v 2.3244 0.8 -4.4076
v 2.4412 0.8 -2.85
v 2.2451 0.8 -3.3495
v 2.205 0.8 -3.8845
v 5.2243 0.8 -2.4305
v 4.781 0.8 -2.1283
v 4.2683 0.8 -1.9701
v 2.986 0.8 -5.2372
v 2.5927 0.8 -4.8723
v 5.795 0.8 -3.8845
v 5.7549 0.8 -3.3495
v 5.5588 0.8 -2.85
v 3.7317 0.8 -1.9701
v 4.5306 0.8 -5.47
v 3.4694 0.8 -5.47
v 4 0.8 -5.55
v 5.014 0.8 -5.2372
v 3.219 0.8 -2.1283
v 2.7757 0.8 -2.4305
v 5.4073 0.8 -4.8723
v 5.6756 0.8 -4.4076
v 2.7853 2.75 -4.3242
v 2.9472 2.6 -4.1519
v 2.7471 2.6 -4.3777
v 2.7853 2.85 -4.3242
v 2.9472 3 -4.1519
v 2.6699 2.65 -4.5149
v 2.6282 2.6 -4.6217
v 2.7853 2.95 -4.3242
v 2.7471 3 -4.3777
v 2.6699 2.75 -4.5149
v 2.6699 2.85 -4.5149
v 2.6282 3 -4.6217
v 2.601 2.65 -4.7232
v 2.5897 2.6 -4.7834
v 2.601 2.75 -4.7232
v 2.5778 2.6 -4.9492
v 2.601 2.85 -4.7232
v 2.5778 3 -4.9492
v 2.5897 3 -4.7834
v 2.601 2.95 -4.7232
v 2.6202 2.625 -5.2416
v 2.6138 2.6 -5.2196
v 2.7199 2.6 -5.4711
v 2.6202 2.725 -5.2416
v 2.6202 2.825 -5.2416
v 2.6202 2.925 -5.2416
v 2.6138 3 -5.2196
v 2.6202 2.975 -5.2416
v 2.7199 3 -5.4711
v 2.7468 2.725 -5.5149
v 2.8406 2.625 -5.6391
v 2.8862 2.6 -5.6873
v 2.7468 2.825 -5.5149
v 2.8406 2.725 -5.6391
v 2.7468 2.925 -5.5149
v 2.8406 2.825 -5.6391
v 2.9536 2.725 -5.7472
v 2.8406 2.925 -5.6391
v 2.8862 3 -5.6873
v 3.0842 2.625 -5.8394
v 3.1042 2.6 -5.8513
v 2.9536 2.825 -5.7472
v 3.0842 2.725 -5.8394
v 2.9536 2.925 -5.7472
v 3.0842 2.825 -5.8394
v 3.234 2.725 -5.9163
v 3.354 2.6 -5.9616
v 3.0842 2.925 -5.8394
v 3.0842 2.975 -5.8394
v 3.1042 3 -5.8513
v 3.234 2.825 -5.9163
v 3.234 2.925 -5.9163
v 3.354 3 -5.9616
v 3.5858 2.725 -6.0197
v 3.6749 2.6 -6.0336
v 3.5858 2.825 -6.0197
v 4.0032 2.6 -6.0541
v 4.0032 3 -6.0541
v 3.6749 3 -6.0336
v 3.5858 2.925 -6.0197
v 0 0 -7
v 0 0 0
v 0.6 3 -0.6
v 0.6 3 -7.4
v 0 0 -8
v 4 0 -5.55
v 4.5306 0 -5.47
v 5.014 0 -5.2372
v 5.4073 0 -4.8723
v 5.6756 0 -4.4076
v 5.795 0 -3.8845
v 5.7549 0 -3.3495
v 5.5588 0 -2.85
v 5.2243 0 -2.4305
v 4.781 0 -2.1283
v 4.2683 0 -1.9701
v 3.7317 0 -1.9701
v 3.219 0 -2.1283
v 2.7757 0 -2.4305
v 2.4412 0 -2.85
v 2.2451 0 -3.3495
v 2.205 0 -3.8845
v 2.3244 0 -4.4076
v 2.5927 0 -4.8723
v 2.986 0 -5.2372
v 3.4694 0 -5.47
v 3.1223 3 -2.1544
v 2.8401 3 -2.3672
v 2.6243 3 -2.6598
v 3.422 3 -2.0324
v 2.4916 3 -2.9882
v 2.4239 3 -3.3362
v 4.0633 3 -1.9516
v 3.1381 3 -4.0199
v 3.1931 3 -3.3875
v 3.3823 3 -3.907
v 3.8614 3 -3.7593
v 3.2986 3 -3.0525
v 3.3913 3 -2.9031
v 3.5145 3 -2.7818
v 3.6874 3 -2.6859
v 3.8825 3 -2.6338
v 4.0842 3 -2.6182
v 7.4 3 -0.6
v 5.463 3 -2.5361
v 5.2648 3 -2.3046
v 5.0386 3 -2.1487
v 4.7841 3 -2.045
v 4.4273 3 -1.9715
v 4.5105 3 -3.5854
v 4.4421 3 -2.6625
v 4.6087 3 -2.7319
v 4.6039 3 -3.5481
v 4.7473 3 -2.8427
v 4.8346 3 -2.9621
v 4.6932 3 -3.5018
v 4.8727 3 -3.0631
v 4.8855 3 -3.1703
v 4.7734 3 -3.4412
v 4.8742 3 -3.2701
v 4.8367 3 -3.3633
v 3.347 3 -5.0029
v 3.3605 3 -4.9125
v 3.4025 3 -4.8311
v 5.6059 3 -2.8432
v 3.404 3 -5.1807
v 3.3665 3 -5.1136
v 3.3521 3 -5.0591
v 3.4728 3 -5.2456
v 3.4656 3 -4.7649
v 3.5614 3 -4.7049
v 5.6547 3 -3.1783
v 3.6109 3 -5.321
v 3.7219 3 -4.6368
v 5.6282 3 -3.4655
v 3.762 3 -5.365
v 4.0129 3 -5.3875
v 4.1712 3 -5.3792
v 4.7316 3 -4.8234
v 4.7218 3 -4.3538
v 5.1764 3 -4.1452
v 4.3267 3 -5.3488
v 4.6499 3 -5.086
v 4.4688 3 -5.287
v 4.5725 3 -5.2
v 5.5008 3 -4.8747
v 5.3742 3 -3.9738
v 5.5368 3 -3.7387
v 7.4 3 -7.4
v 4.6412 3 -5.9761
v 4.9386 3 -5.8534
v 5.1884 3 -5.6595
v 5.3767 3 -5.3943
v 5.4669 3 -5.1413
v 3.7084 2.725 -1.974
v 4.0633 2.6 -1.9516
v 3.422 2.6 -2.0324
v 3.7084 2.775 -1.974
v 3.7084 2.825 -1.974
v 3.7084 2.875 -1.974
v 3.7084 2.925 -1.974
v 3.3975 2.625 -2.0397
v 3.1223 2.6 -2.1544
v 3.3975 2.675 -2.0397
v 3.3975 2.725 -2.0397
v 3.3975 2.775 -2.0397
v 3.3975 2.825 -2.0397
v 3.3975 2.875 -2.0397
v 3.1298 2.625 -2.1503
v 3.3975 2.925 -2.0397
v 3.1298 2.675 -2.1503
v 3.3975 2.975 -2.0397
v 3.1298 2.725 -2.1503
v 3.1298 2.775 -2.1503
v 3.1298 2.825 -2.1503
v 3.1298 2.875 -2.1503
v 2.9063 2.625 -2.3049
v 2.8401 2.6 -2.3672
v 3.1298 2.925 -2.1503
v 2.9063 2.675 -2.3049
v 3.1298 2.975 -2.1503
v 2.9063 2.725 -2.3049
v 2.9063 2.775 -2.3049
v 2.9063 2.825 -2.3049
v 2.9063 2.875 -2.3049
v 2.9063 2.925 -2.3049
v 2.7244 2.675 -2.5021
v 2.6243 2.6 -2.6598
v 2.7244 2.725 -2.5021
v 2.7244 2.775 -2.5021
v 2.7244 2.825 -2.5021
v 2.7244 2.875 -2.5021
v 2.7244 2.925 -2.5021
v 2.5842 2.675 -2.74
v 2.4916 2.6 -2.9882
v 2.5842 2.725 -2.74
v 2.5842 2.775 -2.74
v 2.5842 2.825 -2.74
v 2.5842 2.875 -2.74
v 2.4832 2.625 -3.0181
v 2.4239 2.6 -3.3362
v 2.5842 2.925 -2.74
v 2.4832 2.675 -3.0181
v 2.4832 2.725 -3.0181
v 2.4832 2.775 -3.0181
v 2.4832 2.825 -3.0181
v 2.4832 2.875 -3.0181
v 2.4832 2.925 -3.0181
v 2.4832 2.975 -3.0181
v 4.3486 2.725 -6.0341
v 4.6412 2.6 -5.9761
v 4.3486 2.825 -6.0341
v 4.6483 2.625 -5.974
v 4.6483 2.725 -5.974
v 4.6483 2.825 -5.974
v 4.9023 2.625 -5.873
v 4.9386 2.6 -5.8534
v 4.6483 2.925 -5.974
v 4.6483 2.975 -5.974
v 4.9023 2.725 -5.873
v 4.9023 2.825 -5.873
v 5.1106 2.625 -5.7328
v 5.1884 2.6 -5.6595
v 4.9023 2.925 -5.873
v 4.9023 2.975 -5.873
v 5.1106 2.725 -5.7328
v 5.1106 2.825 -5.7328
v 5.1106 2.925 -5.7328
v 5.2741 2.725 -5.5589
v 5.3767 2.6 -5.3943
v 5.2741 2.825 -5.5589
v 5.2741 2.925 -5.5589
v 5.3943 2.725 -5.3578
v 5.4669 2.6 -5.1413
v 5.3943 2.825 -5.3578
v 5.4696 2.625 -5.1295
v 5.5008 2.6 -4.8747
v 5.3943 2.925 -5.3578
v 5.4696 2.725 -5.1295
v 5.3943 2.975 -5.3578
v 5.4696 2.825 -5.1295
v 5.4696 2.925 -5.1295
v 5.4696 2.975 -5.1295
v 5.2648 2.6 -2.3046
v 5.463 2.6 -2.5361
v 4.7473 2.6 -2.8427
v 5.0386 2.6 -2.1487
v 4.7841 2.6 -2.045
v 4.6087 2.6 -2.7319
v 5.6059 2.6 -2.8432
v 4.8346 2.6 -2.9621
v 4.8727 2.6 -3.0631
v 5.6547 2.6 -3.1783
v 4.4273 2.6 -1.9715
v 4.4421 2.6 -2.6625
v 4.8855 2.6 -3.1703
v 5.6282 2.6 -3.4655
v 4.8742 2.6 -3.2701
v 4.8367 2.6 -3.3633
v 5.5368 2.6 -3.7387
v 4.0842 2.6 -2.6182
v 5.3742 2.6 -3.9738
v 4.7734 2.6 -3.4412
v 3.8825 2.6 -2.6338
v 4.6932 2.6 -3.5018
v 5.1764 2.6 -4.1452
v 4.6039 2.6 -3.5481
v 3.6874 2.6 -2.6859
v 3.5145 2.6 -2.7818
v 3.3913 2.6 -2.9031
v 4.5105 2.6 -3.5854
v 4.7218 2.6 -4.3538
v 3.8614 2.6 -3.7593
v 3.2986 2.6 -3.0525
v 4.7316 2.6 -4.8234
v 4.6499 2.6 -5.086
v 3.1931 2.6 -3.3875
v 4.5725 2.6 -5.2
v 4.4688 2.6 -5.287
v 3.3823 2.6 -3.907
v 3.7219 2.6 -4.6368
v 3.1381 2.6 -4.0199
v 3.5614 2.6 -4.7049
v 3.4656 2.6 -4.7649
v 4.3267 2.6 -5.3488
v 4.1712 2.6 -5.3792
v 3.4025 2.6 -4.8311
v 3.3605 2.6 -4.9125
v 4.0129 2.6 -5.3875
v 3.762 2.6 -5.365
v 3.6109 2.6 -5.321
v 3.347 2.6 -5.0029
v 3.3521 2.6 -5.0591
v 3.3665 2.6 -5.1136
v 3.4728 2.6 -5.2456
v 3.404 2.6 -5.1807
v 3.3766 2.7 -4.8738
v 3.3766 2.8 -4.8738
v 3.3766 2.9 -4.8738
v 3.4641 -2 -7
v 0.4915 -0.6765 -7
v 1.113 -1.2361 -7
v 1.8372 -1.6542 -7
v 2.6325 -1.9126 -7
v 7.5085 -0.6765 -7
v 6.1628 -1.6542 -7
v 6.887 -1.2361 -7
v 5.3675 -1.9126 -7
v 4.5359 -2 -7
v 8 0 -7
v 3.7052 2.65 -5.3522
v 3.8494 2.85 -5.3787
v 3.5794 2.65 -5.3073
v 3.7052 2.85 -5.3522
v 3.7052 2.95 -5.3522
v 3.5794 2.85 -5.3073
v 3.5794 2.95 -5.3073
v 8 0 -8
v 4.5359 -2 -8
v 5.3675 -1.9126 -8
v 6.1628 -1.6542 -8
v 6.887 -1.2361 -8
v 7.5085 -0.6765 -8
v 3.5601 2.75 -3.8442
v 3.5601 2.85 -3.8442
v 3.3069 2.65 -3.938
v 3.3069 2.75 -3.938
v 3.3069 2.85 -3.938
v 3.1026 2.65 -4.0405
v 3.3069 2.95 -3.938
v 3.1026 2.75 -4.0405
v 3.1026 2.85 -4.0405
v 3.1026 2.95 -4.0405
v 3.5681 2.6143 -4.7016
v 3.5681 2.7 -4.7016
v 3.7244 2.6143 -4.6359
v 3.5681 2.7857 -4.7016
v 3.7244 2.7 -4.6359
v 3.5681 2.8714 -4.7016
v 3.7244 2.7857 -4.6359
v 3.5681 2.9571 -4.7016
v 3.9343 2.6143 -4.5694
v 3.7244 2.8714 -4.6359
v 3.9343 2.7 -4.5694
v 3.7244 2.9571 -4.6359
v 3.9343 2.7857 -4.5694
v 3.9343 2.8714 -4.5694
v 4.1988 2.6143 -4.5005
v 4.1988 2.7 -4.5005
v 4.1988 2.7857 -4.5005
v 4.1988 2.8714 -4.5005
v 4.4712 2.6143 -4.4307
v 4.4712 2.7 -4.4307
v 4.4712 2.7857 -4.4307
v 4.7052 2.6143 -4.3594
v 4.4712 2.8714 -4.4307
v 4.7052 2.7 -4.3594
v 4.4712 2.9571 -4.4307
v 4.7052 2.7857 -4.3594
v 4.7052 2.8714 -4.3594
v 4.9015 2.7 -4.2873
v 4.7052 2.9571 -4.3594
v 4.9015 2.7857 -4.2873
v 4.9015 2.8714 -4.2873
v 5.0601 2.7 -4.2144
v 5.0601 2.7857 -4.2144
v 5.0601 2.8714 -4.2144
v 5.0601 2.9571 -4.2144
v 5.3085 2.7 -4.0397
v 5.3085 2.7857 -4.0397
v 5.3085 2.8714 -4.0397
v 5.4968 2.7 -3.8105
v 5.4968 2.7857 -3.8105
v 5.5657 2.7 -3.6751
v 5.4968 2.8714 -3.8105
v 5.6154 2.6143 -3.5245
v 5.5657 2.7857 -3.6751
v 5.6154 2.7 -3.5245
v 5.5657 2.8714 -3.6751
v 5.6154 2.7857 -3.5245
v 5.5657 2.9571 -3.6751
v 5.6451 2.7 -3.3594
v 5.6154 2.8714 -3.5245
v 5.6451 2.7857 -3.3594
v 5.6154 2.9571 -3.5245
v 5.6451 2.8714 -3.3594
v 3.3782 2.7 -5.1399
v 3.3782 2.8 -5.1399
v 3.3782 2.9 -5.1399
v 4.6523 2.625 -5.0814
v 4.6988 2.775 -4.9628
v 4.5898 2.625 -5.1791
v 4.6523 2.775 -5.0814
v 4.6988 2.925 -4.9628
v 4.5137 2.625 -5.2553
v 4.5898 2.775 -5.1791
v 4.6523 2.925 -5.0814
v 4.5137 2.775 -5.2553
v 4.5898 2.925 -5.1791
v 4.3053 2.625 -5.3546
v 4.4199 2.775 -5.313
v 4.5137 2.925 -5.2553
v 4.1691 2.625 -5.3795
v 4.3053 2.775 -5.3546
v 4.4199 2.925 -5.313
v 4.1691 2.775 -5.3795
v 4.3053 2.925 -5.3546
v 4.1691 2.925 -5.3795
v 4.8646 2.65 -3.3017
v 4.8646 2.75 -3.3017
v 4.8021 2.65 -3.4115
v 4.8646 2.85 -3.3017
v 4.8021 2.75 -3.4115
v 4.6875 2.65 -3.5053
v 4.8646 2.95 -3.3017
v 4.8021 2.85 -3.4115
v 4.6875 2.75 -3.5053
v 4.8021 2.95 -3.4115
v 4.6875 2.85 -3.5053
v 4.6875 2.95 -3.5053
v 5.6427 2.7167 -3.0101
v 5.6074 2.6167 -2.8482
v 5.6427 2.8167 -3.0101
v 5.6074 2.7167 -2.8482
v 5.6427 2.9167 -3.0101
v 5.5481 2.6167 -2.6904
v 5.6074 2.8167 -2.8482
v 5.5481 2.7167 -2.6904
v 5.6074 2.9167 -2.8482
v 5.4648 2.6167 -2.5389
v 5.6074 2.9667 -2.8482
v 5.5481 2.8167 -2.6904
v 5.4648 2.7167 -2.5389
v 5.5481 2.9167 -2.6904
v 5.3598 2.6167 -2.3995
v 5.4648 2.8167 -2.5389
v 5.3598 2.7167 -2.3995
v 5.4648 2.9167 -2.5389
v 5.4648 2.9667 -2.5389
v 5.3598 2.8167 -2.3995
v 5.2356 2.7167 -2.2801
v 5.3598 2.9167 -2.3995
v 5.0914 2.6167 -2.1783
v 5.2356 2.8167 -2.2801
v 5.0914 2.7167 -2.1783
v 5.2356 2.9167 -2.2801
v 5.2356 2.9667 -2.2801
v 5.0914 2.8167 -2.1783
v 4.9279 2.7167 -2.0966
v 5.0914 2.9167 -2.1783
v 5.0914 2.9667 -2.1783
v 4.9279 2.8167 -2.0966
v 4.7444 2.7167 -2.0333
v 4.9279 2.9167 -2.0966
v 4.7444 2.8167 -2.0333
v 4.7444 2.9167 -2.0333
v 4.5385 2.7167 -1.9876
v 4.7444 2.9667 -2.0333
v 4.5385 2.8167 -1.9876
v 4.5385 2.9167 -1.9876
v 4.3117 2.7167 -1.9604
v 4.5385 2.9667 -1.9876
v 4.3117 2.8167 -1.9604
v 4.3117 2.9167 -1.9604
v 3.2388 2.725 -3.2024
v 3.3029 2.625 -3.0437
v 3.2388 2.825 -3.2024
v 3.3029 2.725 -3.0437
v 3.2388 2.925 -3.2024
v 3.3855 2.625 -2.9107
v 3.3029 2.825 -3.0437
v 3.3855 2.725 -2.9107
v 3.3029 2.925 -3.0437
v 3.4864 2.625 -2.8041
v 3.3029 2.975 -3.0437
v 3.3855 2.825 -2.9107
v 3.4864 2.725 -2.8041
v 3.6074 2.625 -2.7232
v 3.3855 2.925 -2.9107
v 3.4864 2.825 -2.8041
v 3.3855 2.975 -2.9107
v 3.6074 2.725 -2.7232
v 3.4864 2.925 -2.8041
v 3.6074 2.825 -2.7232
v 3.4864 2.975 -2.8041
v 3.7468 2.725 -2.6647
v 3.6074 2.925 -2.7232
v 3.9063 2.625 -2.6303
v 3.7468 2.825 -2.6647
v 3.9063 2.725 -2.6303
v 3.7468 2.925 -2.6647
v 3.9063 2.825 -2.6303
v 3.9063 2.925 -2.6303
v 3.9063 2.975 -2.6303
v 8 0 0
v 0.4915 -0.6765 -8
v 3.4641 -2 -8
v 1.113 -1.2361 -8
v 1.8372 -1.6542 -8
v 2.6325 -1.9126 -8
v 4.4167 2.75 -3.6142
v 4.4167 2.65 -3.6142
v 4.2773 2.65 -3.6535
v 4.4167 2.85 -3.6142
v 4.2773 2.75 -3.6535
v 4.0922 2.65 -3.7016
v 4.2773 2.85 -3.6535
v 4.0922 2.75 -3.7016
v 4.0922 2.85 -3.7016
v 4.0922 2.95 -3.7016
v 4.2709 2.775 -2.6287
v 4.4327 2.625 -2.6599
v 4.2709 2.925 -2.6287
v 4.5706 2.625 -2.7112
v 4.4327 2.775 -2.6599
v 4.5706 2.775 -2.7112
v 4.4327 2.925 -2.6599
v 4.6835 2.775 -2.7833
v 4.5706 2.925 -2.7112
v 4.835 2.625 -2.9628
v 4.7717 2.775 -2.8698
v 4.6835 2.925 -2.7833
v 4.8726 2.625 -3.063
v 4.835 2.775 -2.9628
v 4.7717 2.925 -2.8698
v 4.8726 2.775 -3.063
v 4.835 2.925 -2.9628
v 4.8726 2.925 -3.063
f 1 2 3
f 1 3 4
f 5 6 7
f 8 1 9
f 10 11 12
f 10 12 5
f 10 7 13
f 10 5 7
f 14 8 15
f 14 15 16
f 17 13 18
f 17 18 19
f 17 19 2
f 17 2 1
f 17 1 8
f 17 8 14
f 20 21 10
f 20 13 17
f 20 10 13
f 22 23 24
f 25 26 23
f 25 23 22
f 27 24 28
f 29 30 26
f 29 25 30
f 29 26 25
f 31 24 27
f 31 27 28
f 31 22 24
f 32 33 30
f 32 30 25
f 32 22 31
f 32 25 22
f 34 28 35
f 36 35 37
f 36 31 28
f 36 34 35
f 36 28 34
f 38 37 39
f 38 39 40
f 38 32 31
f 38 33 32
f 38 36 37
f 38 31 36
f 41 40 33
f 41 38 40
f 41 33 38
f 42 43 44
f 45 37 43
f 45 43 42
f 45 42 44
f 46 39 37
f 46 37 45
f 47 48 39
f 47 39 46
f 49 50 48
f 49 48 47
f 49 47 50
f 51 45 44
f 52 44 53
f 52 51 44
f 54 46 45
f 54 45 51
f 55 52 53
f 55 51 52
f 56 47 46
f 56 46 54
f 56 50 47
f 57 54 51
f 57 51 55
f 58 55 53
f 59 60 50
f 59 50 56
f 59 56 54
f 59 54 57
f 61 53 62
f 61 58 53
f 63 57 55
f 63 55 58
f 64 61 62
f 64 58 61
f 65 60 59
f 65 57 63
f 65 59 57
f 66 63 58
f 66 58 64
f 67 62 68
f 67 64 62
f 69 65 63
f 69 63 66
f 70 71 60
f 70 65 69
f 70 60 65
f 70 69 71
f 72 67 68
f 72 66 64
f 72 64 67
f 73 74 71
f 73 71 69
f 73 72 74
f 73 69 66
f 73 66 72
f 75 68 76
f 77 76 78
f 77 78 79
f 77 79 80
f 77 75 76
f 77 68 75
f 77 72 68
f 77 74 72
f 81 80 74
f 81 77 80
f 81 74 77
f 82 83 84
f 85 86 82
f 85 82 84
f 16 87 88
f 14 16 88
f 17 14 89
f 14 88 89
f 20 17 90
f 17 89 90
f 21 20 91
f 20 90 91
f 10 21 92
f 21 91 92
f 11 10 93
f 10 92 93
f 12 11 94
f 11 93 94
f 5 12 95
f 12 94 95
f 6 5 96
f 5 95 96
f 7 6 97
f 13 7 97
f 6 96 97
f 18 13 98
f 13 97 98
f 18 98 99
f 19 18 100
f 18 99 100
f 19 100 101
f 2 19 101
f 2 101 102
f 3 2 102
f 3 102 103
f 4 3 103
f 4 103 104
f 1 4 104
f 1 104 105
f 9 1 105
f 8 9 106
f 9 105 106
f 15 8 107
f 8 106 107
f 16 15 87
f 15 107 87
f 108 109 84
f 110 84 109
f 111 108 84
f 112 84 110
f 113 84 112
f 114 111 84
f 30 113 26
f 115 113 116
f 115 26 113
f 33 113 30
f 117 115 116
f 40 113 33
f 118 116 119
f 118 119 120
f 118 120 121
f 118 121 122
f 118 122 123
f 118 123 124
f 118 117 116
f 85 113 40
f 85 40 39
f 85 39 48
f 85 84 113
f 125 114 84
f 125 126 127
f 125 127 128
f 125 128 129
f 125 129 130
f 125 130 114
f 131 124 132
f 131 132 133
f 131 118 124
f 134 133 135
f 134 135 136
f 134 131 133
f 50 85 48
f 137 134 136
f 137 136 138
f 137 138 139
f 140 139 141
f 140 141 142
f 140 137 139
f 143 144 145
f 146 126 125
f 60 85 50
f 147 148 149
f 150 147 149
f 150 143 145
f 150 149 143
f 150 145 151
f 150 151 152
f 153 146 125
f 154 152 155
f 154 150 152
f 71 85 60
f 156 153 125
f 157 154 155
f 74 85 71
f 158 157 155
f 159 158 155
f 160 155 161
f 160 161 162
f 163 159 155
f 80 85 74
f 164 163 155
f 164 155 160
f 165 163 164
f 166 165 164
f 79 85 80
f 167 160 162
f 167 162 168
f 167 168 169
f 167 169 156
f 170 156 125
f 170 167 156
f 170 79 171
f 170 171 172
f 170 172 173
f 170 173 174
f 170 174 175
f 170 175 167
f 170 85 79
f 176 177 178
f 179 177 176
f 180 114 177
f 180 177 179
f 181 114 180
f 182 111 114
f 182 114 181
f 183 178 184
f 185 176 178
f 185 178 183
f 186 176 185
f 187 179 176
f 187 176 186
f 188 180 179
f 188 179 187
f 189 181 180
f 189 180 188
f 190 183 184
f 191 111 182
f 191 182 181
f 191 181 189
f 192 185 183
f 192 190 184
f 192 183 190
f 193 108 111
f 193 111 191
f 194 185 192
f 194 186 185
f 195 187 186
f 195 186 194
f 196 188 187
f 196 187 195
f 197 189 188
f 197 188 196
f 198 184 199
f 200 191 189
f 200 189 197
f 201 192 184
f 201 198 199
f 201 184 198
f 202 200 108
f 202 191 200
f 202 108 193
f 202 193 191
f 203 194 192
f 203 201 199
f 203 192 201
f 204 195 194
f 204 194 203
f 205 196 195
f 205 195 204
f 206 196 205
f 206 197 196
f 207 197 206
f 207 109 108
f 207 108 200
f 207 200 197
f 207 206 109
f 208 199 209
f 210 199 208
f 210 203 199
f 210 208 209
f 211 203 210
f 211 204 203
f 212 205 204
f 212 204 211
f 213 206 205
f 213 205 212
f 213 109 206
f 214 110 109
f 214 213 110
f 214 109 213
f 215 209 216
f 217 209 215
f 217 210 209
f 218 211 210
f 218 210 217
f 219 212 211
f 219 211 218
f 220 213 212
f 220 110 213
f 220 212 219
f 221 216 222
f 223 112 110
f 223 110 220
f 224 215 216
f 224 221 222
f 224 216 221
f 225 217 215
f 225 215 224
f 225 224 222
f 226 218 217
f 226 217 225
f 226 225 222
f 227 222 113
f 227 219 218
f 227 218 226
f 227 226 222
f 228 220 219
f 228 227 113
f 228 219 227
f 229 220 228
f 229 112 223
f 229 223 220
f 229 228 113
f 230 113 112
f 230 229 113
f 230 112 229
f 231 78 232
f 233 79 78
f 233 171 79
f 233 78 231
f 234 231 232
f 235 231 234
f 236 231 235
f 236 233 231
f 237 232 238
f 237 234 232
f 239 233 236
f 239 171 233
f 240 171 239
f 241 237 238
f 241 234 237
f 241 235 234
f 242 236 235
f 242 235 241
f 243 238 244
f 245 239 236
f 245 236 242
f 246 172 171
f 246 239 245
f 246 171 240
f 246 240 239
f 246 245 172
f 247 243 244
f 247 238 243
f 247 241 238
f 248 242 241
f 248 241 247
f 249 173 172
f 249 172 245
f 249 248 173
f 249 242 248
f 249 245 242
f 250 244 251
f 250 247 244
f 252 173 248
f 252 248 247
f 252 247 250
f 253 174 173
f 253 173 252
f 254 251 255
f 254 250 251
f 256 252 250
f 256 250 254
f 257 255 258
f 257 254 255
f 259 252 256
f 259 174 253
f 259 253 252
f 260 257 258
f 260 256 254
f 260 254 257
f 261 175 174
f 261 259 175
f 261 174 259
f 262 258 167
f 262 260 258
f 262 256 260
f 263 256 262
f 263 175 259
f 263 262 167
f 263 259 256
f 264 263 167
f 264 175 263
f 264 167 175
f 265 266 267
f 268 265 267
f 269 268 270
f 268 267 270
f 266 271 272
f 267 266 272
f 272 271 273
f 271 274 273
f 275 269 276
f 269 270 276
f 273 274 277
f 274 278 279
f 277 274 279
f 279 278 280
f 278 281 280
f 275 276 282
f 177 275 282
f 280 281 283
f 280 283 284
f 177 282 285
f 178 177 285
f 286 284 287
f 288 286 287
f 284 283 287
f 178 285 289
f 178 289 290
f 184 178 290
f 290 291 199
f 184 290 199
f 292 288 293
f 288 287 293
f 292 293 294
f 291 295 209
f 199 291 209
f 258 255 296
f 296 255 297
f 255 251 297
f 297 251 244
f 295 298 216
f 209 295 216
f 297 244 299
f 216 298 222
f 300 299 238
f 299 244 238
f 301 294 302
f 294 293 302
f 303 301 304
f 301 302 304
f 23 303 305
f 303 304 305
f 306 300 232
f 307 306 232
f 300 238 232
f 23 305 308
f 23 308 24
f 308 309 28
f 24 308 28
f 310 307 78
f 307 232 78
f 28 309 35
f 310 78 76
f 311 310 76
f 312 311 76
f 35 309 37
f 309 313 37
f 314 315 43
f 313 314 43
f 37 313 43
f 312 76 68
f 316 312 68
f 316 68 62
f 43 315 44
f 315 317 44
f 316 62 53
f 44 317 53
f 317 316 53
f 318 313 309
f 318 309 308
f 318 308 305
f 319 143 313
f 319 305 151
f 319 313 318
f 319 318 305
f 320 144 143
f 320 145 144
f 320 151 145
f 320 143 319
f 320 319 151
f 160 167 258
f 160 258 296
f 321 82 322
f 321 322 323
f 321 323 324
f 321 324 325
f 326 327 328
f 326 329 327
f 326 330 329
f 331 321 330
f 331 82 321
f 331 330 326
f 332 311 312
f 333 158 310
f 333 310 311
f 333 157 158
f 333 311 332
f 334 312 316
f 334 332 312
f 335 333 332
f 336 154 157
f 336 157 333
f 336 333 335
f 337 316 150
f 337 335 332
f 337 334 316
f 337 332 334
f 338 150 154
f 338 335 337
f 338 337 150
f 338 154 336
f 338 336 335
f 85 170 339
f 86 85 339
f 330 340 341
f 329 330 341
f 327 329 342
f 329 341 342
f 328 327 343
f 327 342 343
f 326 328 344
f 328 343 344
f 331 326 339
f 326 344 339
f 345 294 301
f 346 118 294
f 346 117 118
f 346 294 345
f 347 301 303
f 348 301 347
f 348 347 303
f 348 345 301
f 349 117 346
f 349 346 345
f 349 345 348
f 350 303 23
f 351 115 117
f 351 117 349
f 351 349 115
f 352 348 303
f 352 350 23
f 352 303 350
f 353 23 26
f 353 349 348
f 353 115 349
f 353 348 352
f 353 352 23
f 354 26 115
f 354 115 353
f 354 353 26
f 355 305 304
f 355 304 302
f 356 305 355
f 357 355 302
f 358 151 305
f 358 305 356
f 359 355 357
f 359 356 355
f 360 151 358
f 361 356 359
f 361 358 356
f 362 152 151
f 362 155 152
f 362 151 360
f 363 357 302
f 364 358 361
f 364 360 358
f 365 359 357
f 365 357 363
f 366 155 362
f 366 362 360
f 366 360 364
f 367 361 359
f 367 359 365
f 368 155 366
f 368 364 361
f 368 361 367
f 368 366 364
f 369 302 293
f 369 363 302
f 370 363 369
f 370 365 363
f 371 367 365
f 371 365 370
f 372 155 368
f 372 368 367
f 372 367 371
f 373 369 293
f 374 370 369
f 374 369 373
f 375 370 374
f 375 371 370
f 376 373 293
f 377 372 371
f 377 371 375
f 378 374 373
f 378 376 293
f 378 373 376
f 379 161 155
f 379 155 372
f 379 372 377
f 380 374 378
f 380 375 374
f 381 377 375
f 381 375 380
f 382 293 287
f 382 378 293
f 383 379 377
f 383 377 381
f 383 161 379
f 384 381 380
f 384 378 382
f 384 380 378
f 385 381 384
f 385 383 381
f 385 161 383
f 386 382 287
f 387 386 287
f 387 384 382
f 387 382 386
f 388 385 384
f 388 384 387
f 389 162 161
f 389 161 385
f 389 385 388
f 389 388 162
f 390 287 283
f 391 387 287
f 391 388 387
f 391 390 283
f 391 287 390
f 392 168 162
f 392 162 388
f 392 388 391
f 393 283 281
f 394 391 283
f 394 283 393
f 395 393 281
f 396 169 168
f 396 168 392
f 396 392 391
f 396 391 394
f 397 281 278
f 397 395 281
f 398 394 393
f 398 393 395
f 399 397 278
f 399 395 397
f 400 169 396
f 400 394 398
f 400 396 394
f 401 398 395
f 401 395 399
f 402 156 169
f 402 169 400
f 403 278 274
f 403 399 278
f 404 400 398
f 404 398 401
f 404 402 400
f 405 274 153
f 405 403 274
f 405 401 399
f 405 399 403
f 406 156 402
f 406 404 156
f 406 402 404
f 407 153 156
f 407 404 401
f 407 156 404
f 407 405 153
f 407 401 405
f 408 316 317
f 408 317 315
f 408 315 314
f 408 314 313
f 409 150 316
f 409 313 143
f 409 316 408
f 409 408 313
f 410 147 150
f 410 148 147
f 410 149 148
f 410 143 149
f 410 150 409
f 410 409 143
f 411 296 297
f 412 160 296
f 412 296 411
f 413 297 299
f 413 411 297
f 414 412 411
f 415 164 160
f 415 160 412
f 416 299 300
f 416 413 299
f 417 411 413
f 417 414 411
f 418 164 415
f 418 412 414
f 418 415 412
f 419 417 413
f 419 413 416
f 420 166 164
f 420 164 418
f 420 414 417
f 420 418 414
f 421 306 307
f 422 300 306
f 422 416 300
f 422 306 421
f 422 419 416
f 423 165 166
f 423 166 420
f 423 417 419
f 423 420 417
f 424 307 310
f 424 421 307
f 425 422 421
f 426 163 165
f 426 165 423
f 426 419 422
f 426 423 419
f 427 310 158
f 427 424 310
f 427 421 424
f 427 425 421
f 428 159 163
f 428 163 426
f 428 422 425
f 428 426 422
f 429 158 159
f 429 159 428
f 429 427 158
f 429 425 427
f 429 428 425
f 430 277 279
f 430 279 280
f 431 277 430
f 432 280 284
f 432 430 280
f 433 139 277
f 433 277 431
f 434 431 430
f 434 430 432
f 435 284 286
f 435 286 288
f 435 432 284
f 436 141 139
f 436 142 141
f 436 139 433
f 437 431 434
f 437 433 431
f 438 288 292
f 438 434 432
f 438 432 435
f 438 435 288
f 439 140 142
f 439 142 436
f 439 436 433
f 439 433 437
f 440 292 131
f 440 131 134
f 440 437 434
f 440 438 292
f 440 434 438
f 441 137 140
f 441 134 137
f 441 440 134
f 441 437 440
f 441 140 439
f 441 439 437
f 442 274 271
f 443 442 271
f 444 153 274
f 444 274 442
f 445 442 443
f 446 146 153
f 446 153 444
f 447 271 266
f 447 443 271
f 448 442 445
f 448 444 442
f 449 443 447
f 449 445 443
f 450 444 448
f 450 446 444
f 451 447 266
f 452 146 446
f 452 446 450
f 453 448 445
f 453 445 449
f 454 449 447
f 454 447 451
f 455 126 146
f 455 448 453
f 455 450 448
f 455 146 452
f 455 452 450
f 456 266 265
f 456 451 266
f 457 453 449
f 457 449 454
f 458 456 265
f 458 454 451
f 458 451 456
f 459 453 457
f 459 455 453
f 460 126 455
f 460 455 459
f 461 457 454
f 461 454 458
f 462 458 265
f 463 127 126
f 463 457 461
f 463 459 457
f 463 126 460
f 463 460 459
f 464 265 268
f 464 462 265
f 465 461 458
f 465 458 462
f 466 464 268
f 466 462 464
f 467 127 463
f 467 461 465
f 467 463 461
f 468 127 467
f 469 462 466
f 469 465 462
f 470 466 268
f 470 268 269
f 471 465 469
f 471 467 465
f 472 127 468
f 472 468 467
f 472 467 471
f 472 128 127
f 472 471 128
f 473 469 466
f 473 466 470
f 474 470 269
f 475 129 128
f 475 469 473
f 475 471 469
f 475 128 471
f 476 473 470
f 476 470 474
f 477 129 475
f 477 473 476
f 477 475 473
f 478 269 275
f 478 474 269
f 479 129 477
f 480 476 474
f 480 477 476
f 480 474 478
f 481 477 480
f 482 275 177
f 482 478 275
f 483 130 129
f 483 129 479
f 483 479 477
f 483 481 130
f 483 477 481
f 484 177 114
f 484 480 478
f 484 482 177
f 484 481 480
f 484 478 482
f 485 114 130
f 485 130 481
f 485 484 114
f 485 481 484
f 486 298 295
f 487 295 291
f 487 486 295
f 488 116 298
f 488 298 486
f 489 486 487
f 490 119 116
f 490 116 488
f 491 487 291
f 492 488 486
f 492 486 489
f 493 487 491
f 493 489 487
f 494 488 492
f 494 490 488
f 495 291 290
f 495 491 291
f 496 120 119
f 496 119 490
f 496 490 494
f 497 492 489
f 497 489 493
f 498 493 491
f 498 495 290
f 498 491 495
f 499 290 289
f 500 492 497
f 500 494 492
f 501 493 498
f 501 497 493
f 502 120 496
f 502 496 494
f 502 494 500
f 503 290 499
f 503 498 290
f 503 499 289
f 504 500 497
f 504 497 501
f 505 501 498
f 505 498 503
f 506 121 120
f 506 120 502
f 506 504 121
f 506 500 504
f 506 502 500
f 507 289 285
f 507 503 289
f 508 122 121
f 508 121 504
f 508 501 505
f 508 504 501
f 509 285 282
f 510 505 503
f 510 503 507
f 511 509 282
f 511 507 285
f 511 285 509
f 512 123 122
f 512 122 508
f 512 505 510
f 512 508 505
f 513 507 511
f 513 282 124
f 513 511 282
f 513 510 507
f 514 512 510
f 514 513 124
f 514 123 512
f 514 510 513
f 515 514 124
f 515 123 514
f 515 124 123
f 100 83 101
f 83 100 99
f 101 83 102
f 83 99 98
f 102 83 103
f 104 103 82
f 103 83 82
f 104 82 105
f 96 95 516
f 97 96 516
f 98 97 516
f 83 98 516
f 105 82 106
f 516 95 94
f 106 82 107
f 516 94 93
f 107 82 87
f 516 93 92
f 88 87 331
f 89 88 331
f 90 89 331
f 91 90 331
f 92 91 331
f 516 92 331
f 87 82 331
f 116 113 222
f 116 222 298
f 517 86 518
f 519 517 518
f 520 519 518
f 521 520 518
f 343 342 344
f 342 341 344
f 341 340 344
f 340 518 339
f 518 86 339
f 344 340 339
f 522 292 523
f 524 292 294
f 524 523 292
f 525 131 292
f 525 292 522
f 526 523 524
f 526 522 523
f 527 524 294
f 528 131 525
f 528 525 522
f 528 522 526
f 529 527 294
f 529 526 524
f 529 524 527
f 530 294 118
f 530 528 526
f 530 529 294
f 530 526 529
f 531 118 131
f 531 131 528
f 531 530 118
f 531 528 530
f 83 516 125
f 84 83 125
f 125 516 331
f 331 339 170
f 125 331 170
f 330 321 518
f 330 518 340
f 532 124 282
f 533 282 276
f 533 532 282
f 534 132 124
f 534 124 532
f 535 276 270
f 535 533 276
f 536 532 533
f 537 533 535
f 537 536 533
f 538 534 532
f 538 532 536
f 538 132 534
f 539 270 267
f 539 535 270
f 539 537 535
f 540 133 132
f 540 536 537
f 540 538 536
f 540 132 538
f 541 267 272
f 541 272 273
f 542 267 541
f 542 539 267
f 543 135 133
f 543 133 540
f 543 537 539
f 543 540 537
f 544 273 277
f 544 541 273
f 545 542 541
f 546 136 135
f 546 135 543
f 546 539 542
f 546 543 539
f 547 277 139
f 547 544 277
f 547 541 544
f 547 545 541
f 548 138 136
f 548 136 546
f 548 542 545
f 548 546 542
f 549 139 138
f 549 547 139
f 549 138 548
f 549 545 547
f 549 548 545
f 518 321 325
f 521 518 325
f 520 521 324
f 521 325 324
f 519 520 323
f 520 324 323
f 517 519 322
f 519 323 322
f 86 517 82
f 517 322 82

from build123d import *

# Parameters (mm, degrees)
SKETCH1_W               = 8
SKETCH1_H               = 8
BOSS_EXTRUDE1_DEPTH     = 3
CUT_EXTRUDE1_DEPTH      = 12.704699911
CUT_EXTRUDE1_DEPTH_BACK = 12.704699911
CUT_EXTRUDE2_DEPTH      = 11
SKETCH4_R               = 1.8
CUT_EXTRUDE3_DEPTH      = 0.8
SKETCH5_W               = 8
SKETCH5_H               = 1
BOSS_EXTRUDE2_DEPTH     = 2
FILLET1_R               = 4
CUT_EXTRUDE4_DEPTH      = 0.4


with BuildPart() as part:
    # Sketch1 → Boss-Extrude1 (new body)
    with BuildSketch(Plane(origin=(0, 0, 0), x_dir=(1, 0, 0), z_dir=(0, 1, 0))):
        with Locations((4, 4)):
            Rectangle(SKETCH1_W, SKETCH1_H)
    extrude(amount=BOSS_EXTRUDE1_DEPTH)

    # Sketch2 → Cut-Extrude1 (cut, two sides: drawn at the far end of the back side and taken through both)
    with BuildSketch(Plane.XY.offset(-CUT_EXTRUDE1_DEPTH_BACK)):
        Polygon((0, 0), (0.6, 3), (0, 3), align=None)
        Polygon((8, 0), (7.4, 3), (8, 3), align=None)
    extrude(amount=CUT_EXTRUDE1_DEPTH + CUT_EXTRUDE1_DEPTH_BACK, mode=Mode.SUBTRACT)

    # Sketch3 → Cut-Extrude2 (cut)
    with BuildSketch(Plane(origin=(0, 0, 0), x_dir=(0, 0, -1), z_dir=(1, 0, 0))):
        Polygon((0, 0), (0.6, 3), (0, 3), align=None)
        Polygon((8, 3), (7.4, 3), (8, 0), align=None)
    extrude(amount=CUT_EXTRUDE2_DEPTH, mode=Mode.SUBTRACT)

    # Sketch4 → Cut-Extrude3 (cut)
    with BuildSketch(Plane.XZ):
        with Locations(Location((4, -3.75, 0), (0, 0, 270))):
            Circle(SKETCH4_R)
    extrude(amount=-CUT_EXTRUDE3_DEPTH, mode=Mode.SUBTRACT)

    # Sketch5 → Boss-Extrude2 (add)
    with BuildSketch(Plane.XZ):
        with Locations((4, -7.5)):
            Rectangle(SKETCH5_W, SKETCH5_H)
    extrude(amount=BOSS_EXTRUDE2_DEPTH)

    # Fillet1
    # the kernel refuses this fillet: 4 mm, written as the material it takes off along each edge
    with BuildSketch(Plane(origin=(8, -2, -16.660254038), x_dir=(0, 1, 0), z_dir=(0, 0, 1)), Plane(origin=(0, -2, 1.660254038), x_dir=(0, 1, 0), z_dir=(0, 0, -1))) as fillet1_piece_1:
        with BuildLine():
            CenterArc((4, 3.464101615), FILLET1_R, 180, 60)
            Line((0, 3.464101615), (-0.08, 3.464101615))
            Line((-0.08, 3.464101615), (-0.08, 0))
            Line((-0.08, 0), (0, -0.08))
            ThreePointArc((0, -0.08), (1, -0.08), (1.96, -0.069282032))
            Line((1.96, -0.069282032), (2, 0))
        make_face()
    extrude(amount=18.320508076, mode=Mode.SUBTRACT)

    # Sketch6 → Cut-Extrude4 (cut)
    with BuildSketch(Plane(origin=(0, 3, 0), x_dir=(1, 0, 0), z_dir=(0, 1, 0))):
        with BuildLine():
            Line((2.423916505, 3.336189685), (3.193147274, 3.387471736))
            add(Edge.make_bspline(
                [(3.193147274, 3.387471736), (3.199275518, 3.35528983), (3.211179242, 3.292778523), (3.237627081, 3.203691377), (3.266738832, 3.12063689), (3.30152897, 3.044505684), (3.339615284, 2.973890515), (3.38412658, 2.910803039), (3.431957638, 2.853229033), (3.485476185, 2.803236311), (3.543783948, 2.759451994), (3.607171876, 2.722111271), (3.674953108, 2.6897922), (3.747293374, 2.663178469), (3.824938253, 2.64331119), (3.907211345, 2.629176798), (3.994230643, 2.620125524), (4.053701404, 2.618879435), (4.084172915, 2.618240967)],
                knots=[0, 0, 0, 0, 1.204560339, 2.339781841, 3.415289417, 4.440034832, 5.416475564, 6.362424008, 7.275913008, 8.16578645, 9.05021719, 9.95355393, 10.867835453, 11.809845306, 12.784702352, 13.812224031, 14.87903166, 16, 16, 16, 16], degree=3))
            add(Edge.make_bspline(
                [(4.084172915, 2.618240967), (4.116246108, 2.618590883), (4.178630121, 2.619271489), (4.269031453, 2.627715), (4.353560804, 2.639811238), (4.431471751, 2.6589593), (4.504219207, 2.680373377), (4.569996427, 2.709670116), (4.629867843, 2.743459668), (4.683679212, 2.781802056), (4.730640445, 2.824326515), (4.771724475, 2.86872067), (4.807505951, 2.914025405), (4.835668504, 2.962251146), (4.858460082, 3.011447443), (4.873523718, 3.063081907), (4.883700097, 3.1159689), (4.884867031, 3.152113555), (4.885454967, 3.1703243)],
                knots=[0, 0, 0, 0, 1.417779877, 2.757654889, 4.012140507, 5.189587551, 6.302846416, 7.360586765, 8.365575446, 9.33904572, 10.275781718, 11.161696098, 12.012180333, 12.822428111, 13.625933072, 14.403138519, 15.195454004, 16, 16, 16, 16], degree=3))
            add(Edge.make_bspline(
                [(4.885454967, 3.1703243), (4.884733913, 3.193140887), (4.883323278, 3.237778199), (4.866340641, 3.301592127), (4.840872442, 3.360713887), (4.802526135, 3.41427025), (4.750979261, 3.463212961), (4.685226085, 3.508997669), (4.603431212, 3.550186), (4.542750055, 3.573160928), (4.510454967, 3.585388403)],
                knots=[0, 0, 0, 0, 0.90494901, 1.770400303, 2.607161909, 3.452839393, 4.36912122, 5.420987164, 6.627424851, 8, 8, 8, 8], degree=3))
            add(Edge.make_bspline(
                [(4.510454967, 3.585388403), (4.496597999, 3.590031937), (4.465588357, 3.600423411), (4.4126892, 3.615282239), (4.348970759, 3.633836968), (4.273512264, 3.654927379), (4.186339087, 3.676497317), (4.088424838, 3.703069034), (3.978575834, 3.729510064), (3.901725338, 3.749028827), (3.861416505, 3.759266608)],
                knots=[0, 0, 0, 0, 0.521821638, 1.167752076, 1.961721917, 2.891982557, 3.96540661, 5.168436773, 6.514817513, 8, 8, 8, 8], degree=3))
            add(Edge.make_bspline(
                [(3.861416505, 3.759266608), (3.808922441, 3.772373151), (3.707643728, 3.797660082), (3.563197092, 3.84264374), (3.430159098, 3.887337495), (3.309810688, 3.935832618), (3.200824367, 3.984842463), (3.104963023, 4.037807847), (3.02022624, 4.091978089), (2.970848149, 4.132466251), (2.947153685, 4.151894813)],
                knots=[0, 0, 0, 0, 1.293880989, 2.496331788, 3.617634808, 4.64976062, 5.598842568, 6.473791081, 7.267636666, 8, 8, 8, 8], degree=3))
            add(Edge.make_bspline(
                [(2.947153685, 4.151894813), (2.917769469, 4.179407128), (2.860158996, 4.233347566), (2.784323751, 4.321982057), (2.720601495, 4.415610216), (2.668151102, 4.513540942), (2.627765291, 4.616338017), (2.599140348, 4.723313361), (2.580613245, 4.834746169), (2.578722682, 4.91063455), (2.577762659, 4.949170454)],
                knots=[0, 0, 0, 0, 1.064429417, 2.086912298, 3.078678339, 4.055528992, 5.020032834, 5.993708893, 6.981211098, 8, 8, 8, 8], degree=3))
            add(Edge.make_bspline(
                [(2.577762659, 4.949170454), (2.579632311, 4.999035454), (2.583341142, 5.097952729), (2.617353538, 5.24334762), (2.670335558, 5.383642492), (2.731782138, 5.495041815), (2.790819043, 5.579315825), (2.839844896, 5.639790083), (2.893704531, 5.696388175), (2.953135712, 5.747729494), (3.015931612, 5.796821395), (3.084525186, 5.840415592), (3.156971597, 5.881478913), (3.261809808, 5.93015757), (3.404151332, 5.980885512), (3.589345301, 6.023645948), (3.790984862, 6.049350493), (3.930782191, 6.052503897), (4.003243428, 6.054138403)],
                knots=[0, 0, 0, 0, 1.180131776, 2.341029169, 3.518901375, 4.725685298, 5.343762192, 5.955650671, 6.568945152, 7.192346361, 7.815201106, 8.455999361, 9.116257477, 9.787318263, 11.192748436, 12.688084276, 14.283332633, 16, 16, 16, 16], degree=3))
            add(Edge.make_bspline(
                [(4.003243428, 6.054138403), (4.062574751, 6.053344994), (4.177972905, 6.051801831), (4.345255933, 6.036197125), (4.501507358, 6.011910245), (4.646178875, 5.977046542), (4.779337891, 5.930982439), (4.901500568, 5.876111383), (5.012563098, 5.81096567), (5.111173405, 5.735171454), (5.199025737, 5.651613191), (5.275662846, 5.560343317), (5.341377732, 5.462514514), (5.396594511, 5.358198276), (5.439956101, 5.246858263), (5.471803478, 5.128633406), (5.492867609, 5.003801978), (5.498147397, 4.918266237), (5.500839582, 4.874651223)],
                knots=[0, 0, 0, 0, 1.325124071, 2.577337985, 3.749592149, 4.855247722, 5.896868755, 6.892903601, 7.842551483, 8.766257401, 9.665194363, 10.546067736, 11.423174165, 12.293291263, 13.177512979, 14.086532529, 15.024315359, 16, 16, 16, 16], degree=3))
            Line((5.500839582, 4.874651223), (4.731608813, 4.823369172))
            add(Edge.make_bspline(
                [(4.731608813, 4.823369172), (4.727171315, 4.847490186), (4.718523093, 4.894499533), (4.699719489, 4.96182647), (4.678509937, 5.024096207), (4.653685255, 5.081308344), (4.623700039, 5.13243816), (4.591067506, 5.179094223), (4.554887475, 5.220654869), (4.51396201, 5.255982033), (4.469697485, 5.288128305), (4.419251527, 5.313894286), (4.364737876, 5.337799444), (4.30408262, 5.355770261), (4.238450559, 5.370025359), (4.167803464, 5.380593162), (4.091994892, 5.385752959), (4.039841388, 5.386885694), (4.012858813, 5.387471736)],
                knots=[0, 0, 0, 0, 1.151066407, 2.24330871, 3.278475654, 4.238599069, 5.165719782, 6.056502506, 6.909492653, 7.744782051, 8.590364415, 9.471203867, 10.39832458, 11.382154319, 12.435022857, 13.550631277, 14.73277401, 16, 16, 16, 16], degree=3))
            add(Edge.make_bspline(
                [(4.012858813, 5.387471736), (3.984804304, 5.386954358), (3.930223002, 5.385947775), (3.850683499, 5.379770524), (3.776069477, 5.368367912), (3.706014485, 5.353524542), (3.640612102, 5.333331162), (3.580000346, 5.308708643), (3.523901913, 5.279720359), (3.489695535, 5.256913378), (3.47279471, 5.245644813)],
                knots=[0, 0, 0, 0, 1.186678824, 2.308736671, 3.37120409, 4.377216403, 5.334874112, 6.262130804, 7.141346615, 8, 8, 8, 8], degree=3))
            add(Edge.make_bspline(
                [(3.47279471, 5.245644813), (3.453453136, 5.230251633), (3.415994509, 5.200439822), (3.3756811, 5.141243702), (3.351412335, 5.074383458), (3.348491314, 5.027102037), (3.346993428, 5.002856352)],
                knots=[0, 0, 0, 0, 1.037857257, 2.010007357, 2.979541333, 4, 4, 4, 4], degree=3))
            add(Edge.make_bspline(
                [(3.346993428, 5.002856352), (3.348218426, 4.980197149), (3.350631475, 4.935562125), (3.374970191, 4.872157107), (3.41239982, 4.813407798), (3.447371668, 4.781494404), (3.465583172, 4.764875582)],
                knots=[0, 0, 0, 0, 0.98538058, 1.941042925, 2.927803204, 4, 4, 4, 4], degree=3))
            add(Edge.make_bspline(
                [(3.465583172, 4.764875582), (3.480036346, 4.754089134), (3.512333176, 4.72998591), (3.571494566, 4.699348433), (3.642903916, 4.666166195), (3.728189187, 4.633726893), (3.826783574, 4.601347807), (3.938693075, 4.567540299), (4.063986517, 4.533278892), (4.199470233, 4.500098399), (4.337024364, 4.467483879), (4.46828848, 4.431827004), (4.590345232, 4.397064309), (4.702628677, 4.360627363), (4.805717615, 4.325156109), (4.899111277, 4.288724577), (4.98345094, 4.253244341), (5.081800337, 4.204456503), (5.193269487, 4.138371404), (5.310101731, 4.042305693), (5.413424942, 3.934321559), (5.485417809, 3.83249997), (5.534873142, 3.744930694), (5.566717158, 3.675127784), (5.59426473, 3.601573118), (5.616688379, 3.524185412), (5.632940128, 3.442855773), (5.646389397, 3.358205559), (5.653260877, 3.269531733), (5.654205671, 3.209062493), (5.654685736, 3.178337121)],
                knots=[0, 0, 0, 0, 0.511875881, 1.143829537, 1.88775736, 2.750598373, 3.734912702, 4.837306479, 6.073130119, 7.42648979, 8.801963576, 10.091065733, 11.292408984, 12.408830014, 13.446061236, 14.39066453, 15.257936293, 16.045629259, 17.510392066, 18.929669597, 20.331293837, 21.746891395, 22.460690638, 23.187651344, 23.925159671, 24.69163991, 25.474819891, 26.281170188, 27.126635539, 28, 28, 28, 28], degree=3))
            add(Edge.make_bspline(
                [(5.654685736, 3.178337121), (5.654025632, 3.150001459), (5.652714728, 3.093729578), (5.643553782, 3.010207902), (5.629386607, 2.928169417), (5.608414322, 2.847511277), (5.580592445, 2.768392154), (5.549267222, 2.689670139), (5.510096795, 2.613061996), (5.465515506, 2.538504273), (5.41634032, 2.466052922), (5.360615699, 2.3992182), (5.301614691, 2.335770341), (5.235567289, 2.279262071), (5.166552067, 2.225117883), (5.091412341, 2.177166881), (5.011908526, 2.133775469), (4.927537931, 2.095267608), (4.838001417, 2.061711489), (4.743415274, 2.031844209), (4.642927337, 2.007400135), (4.537375532, 1.986448484), (4.426373586, 1.970515295), (4.310060277, 1.959390224), (4.188409162, 1.953116354), (4.105547428, 1.952094705), (4.063339582, 1.9515743)],
                knots=[0, 0, 0, 0, 0.900570041, 1.788444861, 2.667795364, 3.545012114, 4.433698372, 5.332345486, 6.235991676, 7.164928091, 8.092777575, 9.015680987, 9.928493428, 10.842962589, 11.775229507, 12.714851019, 13.672254427, 14.652424454, 15.660007982, 16.709910502, 17.803296389, 18.945495772, 20.129342395, 21.366102753, 22.658353839, 24, 24, 24, 24], degree=3))
            add(Edge.make_bspline(
                [(4.063339582, 1.9515743), (4.002397965, 1.952569276), (3.883743193, 1.954506517), (3.711359118, 1.971846347), (3.549674268, 1.998386209), (3.398951853, 2.0369045), (3.259007654, 2.086353292), (3.129905498, 2.147263285), (3.012269836, 2.219998383), (2.90464369, 2.302794639), (2.808461007, 2.397160809), (2.721973345, 2.501141662), (2.646347447, 2.615673526), (2.58163302, 2.740577261), (2.526193974, 2.875177636), (2.480472858, 3.01953646), (2.446047261, 3.174342245), (2.431421007, 3.281307488), (2.423916505, 3.336189685)],
                knots=[0, 0, 0, 0, 1.217954099, 2.371385517, 3.459848295, 4.490682126, 5.476952527, 6.422732854, 7.338496285, 8.236688651, 9.131557988, 10.026443255, 10.935708282, 11.869506048, 12.834296687, 13.842423496, 14.892981177, 16, 16, 16, 16], degree=3))
        make_face()
    extrude(amount=-CUT_EXTRUDE4_DEPTH, mode=Mode.SUBTRACT)


solid = part.part
